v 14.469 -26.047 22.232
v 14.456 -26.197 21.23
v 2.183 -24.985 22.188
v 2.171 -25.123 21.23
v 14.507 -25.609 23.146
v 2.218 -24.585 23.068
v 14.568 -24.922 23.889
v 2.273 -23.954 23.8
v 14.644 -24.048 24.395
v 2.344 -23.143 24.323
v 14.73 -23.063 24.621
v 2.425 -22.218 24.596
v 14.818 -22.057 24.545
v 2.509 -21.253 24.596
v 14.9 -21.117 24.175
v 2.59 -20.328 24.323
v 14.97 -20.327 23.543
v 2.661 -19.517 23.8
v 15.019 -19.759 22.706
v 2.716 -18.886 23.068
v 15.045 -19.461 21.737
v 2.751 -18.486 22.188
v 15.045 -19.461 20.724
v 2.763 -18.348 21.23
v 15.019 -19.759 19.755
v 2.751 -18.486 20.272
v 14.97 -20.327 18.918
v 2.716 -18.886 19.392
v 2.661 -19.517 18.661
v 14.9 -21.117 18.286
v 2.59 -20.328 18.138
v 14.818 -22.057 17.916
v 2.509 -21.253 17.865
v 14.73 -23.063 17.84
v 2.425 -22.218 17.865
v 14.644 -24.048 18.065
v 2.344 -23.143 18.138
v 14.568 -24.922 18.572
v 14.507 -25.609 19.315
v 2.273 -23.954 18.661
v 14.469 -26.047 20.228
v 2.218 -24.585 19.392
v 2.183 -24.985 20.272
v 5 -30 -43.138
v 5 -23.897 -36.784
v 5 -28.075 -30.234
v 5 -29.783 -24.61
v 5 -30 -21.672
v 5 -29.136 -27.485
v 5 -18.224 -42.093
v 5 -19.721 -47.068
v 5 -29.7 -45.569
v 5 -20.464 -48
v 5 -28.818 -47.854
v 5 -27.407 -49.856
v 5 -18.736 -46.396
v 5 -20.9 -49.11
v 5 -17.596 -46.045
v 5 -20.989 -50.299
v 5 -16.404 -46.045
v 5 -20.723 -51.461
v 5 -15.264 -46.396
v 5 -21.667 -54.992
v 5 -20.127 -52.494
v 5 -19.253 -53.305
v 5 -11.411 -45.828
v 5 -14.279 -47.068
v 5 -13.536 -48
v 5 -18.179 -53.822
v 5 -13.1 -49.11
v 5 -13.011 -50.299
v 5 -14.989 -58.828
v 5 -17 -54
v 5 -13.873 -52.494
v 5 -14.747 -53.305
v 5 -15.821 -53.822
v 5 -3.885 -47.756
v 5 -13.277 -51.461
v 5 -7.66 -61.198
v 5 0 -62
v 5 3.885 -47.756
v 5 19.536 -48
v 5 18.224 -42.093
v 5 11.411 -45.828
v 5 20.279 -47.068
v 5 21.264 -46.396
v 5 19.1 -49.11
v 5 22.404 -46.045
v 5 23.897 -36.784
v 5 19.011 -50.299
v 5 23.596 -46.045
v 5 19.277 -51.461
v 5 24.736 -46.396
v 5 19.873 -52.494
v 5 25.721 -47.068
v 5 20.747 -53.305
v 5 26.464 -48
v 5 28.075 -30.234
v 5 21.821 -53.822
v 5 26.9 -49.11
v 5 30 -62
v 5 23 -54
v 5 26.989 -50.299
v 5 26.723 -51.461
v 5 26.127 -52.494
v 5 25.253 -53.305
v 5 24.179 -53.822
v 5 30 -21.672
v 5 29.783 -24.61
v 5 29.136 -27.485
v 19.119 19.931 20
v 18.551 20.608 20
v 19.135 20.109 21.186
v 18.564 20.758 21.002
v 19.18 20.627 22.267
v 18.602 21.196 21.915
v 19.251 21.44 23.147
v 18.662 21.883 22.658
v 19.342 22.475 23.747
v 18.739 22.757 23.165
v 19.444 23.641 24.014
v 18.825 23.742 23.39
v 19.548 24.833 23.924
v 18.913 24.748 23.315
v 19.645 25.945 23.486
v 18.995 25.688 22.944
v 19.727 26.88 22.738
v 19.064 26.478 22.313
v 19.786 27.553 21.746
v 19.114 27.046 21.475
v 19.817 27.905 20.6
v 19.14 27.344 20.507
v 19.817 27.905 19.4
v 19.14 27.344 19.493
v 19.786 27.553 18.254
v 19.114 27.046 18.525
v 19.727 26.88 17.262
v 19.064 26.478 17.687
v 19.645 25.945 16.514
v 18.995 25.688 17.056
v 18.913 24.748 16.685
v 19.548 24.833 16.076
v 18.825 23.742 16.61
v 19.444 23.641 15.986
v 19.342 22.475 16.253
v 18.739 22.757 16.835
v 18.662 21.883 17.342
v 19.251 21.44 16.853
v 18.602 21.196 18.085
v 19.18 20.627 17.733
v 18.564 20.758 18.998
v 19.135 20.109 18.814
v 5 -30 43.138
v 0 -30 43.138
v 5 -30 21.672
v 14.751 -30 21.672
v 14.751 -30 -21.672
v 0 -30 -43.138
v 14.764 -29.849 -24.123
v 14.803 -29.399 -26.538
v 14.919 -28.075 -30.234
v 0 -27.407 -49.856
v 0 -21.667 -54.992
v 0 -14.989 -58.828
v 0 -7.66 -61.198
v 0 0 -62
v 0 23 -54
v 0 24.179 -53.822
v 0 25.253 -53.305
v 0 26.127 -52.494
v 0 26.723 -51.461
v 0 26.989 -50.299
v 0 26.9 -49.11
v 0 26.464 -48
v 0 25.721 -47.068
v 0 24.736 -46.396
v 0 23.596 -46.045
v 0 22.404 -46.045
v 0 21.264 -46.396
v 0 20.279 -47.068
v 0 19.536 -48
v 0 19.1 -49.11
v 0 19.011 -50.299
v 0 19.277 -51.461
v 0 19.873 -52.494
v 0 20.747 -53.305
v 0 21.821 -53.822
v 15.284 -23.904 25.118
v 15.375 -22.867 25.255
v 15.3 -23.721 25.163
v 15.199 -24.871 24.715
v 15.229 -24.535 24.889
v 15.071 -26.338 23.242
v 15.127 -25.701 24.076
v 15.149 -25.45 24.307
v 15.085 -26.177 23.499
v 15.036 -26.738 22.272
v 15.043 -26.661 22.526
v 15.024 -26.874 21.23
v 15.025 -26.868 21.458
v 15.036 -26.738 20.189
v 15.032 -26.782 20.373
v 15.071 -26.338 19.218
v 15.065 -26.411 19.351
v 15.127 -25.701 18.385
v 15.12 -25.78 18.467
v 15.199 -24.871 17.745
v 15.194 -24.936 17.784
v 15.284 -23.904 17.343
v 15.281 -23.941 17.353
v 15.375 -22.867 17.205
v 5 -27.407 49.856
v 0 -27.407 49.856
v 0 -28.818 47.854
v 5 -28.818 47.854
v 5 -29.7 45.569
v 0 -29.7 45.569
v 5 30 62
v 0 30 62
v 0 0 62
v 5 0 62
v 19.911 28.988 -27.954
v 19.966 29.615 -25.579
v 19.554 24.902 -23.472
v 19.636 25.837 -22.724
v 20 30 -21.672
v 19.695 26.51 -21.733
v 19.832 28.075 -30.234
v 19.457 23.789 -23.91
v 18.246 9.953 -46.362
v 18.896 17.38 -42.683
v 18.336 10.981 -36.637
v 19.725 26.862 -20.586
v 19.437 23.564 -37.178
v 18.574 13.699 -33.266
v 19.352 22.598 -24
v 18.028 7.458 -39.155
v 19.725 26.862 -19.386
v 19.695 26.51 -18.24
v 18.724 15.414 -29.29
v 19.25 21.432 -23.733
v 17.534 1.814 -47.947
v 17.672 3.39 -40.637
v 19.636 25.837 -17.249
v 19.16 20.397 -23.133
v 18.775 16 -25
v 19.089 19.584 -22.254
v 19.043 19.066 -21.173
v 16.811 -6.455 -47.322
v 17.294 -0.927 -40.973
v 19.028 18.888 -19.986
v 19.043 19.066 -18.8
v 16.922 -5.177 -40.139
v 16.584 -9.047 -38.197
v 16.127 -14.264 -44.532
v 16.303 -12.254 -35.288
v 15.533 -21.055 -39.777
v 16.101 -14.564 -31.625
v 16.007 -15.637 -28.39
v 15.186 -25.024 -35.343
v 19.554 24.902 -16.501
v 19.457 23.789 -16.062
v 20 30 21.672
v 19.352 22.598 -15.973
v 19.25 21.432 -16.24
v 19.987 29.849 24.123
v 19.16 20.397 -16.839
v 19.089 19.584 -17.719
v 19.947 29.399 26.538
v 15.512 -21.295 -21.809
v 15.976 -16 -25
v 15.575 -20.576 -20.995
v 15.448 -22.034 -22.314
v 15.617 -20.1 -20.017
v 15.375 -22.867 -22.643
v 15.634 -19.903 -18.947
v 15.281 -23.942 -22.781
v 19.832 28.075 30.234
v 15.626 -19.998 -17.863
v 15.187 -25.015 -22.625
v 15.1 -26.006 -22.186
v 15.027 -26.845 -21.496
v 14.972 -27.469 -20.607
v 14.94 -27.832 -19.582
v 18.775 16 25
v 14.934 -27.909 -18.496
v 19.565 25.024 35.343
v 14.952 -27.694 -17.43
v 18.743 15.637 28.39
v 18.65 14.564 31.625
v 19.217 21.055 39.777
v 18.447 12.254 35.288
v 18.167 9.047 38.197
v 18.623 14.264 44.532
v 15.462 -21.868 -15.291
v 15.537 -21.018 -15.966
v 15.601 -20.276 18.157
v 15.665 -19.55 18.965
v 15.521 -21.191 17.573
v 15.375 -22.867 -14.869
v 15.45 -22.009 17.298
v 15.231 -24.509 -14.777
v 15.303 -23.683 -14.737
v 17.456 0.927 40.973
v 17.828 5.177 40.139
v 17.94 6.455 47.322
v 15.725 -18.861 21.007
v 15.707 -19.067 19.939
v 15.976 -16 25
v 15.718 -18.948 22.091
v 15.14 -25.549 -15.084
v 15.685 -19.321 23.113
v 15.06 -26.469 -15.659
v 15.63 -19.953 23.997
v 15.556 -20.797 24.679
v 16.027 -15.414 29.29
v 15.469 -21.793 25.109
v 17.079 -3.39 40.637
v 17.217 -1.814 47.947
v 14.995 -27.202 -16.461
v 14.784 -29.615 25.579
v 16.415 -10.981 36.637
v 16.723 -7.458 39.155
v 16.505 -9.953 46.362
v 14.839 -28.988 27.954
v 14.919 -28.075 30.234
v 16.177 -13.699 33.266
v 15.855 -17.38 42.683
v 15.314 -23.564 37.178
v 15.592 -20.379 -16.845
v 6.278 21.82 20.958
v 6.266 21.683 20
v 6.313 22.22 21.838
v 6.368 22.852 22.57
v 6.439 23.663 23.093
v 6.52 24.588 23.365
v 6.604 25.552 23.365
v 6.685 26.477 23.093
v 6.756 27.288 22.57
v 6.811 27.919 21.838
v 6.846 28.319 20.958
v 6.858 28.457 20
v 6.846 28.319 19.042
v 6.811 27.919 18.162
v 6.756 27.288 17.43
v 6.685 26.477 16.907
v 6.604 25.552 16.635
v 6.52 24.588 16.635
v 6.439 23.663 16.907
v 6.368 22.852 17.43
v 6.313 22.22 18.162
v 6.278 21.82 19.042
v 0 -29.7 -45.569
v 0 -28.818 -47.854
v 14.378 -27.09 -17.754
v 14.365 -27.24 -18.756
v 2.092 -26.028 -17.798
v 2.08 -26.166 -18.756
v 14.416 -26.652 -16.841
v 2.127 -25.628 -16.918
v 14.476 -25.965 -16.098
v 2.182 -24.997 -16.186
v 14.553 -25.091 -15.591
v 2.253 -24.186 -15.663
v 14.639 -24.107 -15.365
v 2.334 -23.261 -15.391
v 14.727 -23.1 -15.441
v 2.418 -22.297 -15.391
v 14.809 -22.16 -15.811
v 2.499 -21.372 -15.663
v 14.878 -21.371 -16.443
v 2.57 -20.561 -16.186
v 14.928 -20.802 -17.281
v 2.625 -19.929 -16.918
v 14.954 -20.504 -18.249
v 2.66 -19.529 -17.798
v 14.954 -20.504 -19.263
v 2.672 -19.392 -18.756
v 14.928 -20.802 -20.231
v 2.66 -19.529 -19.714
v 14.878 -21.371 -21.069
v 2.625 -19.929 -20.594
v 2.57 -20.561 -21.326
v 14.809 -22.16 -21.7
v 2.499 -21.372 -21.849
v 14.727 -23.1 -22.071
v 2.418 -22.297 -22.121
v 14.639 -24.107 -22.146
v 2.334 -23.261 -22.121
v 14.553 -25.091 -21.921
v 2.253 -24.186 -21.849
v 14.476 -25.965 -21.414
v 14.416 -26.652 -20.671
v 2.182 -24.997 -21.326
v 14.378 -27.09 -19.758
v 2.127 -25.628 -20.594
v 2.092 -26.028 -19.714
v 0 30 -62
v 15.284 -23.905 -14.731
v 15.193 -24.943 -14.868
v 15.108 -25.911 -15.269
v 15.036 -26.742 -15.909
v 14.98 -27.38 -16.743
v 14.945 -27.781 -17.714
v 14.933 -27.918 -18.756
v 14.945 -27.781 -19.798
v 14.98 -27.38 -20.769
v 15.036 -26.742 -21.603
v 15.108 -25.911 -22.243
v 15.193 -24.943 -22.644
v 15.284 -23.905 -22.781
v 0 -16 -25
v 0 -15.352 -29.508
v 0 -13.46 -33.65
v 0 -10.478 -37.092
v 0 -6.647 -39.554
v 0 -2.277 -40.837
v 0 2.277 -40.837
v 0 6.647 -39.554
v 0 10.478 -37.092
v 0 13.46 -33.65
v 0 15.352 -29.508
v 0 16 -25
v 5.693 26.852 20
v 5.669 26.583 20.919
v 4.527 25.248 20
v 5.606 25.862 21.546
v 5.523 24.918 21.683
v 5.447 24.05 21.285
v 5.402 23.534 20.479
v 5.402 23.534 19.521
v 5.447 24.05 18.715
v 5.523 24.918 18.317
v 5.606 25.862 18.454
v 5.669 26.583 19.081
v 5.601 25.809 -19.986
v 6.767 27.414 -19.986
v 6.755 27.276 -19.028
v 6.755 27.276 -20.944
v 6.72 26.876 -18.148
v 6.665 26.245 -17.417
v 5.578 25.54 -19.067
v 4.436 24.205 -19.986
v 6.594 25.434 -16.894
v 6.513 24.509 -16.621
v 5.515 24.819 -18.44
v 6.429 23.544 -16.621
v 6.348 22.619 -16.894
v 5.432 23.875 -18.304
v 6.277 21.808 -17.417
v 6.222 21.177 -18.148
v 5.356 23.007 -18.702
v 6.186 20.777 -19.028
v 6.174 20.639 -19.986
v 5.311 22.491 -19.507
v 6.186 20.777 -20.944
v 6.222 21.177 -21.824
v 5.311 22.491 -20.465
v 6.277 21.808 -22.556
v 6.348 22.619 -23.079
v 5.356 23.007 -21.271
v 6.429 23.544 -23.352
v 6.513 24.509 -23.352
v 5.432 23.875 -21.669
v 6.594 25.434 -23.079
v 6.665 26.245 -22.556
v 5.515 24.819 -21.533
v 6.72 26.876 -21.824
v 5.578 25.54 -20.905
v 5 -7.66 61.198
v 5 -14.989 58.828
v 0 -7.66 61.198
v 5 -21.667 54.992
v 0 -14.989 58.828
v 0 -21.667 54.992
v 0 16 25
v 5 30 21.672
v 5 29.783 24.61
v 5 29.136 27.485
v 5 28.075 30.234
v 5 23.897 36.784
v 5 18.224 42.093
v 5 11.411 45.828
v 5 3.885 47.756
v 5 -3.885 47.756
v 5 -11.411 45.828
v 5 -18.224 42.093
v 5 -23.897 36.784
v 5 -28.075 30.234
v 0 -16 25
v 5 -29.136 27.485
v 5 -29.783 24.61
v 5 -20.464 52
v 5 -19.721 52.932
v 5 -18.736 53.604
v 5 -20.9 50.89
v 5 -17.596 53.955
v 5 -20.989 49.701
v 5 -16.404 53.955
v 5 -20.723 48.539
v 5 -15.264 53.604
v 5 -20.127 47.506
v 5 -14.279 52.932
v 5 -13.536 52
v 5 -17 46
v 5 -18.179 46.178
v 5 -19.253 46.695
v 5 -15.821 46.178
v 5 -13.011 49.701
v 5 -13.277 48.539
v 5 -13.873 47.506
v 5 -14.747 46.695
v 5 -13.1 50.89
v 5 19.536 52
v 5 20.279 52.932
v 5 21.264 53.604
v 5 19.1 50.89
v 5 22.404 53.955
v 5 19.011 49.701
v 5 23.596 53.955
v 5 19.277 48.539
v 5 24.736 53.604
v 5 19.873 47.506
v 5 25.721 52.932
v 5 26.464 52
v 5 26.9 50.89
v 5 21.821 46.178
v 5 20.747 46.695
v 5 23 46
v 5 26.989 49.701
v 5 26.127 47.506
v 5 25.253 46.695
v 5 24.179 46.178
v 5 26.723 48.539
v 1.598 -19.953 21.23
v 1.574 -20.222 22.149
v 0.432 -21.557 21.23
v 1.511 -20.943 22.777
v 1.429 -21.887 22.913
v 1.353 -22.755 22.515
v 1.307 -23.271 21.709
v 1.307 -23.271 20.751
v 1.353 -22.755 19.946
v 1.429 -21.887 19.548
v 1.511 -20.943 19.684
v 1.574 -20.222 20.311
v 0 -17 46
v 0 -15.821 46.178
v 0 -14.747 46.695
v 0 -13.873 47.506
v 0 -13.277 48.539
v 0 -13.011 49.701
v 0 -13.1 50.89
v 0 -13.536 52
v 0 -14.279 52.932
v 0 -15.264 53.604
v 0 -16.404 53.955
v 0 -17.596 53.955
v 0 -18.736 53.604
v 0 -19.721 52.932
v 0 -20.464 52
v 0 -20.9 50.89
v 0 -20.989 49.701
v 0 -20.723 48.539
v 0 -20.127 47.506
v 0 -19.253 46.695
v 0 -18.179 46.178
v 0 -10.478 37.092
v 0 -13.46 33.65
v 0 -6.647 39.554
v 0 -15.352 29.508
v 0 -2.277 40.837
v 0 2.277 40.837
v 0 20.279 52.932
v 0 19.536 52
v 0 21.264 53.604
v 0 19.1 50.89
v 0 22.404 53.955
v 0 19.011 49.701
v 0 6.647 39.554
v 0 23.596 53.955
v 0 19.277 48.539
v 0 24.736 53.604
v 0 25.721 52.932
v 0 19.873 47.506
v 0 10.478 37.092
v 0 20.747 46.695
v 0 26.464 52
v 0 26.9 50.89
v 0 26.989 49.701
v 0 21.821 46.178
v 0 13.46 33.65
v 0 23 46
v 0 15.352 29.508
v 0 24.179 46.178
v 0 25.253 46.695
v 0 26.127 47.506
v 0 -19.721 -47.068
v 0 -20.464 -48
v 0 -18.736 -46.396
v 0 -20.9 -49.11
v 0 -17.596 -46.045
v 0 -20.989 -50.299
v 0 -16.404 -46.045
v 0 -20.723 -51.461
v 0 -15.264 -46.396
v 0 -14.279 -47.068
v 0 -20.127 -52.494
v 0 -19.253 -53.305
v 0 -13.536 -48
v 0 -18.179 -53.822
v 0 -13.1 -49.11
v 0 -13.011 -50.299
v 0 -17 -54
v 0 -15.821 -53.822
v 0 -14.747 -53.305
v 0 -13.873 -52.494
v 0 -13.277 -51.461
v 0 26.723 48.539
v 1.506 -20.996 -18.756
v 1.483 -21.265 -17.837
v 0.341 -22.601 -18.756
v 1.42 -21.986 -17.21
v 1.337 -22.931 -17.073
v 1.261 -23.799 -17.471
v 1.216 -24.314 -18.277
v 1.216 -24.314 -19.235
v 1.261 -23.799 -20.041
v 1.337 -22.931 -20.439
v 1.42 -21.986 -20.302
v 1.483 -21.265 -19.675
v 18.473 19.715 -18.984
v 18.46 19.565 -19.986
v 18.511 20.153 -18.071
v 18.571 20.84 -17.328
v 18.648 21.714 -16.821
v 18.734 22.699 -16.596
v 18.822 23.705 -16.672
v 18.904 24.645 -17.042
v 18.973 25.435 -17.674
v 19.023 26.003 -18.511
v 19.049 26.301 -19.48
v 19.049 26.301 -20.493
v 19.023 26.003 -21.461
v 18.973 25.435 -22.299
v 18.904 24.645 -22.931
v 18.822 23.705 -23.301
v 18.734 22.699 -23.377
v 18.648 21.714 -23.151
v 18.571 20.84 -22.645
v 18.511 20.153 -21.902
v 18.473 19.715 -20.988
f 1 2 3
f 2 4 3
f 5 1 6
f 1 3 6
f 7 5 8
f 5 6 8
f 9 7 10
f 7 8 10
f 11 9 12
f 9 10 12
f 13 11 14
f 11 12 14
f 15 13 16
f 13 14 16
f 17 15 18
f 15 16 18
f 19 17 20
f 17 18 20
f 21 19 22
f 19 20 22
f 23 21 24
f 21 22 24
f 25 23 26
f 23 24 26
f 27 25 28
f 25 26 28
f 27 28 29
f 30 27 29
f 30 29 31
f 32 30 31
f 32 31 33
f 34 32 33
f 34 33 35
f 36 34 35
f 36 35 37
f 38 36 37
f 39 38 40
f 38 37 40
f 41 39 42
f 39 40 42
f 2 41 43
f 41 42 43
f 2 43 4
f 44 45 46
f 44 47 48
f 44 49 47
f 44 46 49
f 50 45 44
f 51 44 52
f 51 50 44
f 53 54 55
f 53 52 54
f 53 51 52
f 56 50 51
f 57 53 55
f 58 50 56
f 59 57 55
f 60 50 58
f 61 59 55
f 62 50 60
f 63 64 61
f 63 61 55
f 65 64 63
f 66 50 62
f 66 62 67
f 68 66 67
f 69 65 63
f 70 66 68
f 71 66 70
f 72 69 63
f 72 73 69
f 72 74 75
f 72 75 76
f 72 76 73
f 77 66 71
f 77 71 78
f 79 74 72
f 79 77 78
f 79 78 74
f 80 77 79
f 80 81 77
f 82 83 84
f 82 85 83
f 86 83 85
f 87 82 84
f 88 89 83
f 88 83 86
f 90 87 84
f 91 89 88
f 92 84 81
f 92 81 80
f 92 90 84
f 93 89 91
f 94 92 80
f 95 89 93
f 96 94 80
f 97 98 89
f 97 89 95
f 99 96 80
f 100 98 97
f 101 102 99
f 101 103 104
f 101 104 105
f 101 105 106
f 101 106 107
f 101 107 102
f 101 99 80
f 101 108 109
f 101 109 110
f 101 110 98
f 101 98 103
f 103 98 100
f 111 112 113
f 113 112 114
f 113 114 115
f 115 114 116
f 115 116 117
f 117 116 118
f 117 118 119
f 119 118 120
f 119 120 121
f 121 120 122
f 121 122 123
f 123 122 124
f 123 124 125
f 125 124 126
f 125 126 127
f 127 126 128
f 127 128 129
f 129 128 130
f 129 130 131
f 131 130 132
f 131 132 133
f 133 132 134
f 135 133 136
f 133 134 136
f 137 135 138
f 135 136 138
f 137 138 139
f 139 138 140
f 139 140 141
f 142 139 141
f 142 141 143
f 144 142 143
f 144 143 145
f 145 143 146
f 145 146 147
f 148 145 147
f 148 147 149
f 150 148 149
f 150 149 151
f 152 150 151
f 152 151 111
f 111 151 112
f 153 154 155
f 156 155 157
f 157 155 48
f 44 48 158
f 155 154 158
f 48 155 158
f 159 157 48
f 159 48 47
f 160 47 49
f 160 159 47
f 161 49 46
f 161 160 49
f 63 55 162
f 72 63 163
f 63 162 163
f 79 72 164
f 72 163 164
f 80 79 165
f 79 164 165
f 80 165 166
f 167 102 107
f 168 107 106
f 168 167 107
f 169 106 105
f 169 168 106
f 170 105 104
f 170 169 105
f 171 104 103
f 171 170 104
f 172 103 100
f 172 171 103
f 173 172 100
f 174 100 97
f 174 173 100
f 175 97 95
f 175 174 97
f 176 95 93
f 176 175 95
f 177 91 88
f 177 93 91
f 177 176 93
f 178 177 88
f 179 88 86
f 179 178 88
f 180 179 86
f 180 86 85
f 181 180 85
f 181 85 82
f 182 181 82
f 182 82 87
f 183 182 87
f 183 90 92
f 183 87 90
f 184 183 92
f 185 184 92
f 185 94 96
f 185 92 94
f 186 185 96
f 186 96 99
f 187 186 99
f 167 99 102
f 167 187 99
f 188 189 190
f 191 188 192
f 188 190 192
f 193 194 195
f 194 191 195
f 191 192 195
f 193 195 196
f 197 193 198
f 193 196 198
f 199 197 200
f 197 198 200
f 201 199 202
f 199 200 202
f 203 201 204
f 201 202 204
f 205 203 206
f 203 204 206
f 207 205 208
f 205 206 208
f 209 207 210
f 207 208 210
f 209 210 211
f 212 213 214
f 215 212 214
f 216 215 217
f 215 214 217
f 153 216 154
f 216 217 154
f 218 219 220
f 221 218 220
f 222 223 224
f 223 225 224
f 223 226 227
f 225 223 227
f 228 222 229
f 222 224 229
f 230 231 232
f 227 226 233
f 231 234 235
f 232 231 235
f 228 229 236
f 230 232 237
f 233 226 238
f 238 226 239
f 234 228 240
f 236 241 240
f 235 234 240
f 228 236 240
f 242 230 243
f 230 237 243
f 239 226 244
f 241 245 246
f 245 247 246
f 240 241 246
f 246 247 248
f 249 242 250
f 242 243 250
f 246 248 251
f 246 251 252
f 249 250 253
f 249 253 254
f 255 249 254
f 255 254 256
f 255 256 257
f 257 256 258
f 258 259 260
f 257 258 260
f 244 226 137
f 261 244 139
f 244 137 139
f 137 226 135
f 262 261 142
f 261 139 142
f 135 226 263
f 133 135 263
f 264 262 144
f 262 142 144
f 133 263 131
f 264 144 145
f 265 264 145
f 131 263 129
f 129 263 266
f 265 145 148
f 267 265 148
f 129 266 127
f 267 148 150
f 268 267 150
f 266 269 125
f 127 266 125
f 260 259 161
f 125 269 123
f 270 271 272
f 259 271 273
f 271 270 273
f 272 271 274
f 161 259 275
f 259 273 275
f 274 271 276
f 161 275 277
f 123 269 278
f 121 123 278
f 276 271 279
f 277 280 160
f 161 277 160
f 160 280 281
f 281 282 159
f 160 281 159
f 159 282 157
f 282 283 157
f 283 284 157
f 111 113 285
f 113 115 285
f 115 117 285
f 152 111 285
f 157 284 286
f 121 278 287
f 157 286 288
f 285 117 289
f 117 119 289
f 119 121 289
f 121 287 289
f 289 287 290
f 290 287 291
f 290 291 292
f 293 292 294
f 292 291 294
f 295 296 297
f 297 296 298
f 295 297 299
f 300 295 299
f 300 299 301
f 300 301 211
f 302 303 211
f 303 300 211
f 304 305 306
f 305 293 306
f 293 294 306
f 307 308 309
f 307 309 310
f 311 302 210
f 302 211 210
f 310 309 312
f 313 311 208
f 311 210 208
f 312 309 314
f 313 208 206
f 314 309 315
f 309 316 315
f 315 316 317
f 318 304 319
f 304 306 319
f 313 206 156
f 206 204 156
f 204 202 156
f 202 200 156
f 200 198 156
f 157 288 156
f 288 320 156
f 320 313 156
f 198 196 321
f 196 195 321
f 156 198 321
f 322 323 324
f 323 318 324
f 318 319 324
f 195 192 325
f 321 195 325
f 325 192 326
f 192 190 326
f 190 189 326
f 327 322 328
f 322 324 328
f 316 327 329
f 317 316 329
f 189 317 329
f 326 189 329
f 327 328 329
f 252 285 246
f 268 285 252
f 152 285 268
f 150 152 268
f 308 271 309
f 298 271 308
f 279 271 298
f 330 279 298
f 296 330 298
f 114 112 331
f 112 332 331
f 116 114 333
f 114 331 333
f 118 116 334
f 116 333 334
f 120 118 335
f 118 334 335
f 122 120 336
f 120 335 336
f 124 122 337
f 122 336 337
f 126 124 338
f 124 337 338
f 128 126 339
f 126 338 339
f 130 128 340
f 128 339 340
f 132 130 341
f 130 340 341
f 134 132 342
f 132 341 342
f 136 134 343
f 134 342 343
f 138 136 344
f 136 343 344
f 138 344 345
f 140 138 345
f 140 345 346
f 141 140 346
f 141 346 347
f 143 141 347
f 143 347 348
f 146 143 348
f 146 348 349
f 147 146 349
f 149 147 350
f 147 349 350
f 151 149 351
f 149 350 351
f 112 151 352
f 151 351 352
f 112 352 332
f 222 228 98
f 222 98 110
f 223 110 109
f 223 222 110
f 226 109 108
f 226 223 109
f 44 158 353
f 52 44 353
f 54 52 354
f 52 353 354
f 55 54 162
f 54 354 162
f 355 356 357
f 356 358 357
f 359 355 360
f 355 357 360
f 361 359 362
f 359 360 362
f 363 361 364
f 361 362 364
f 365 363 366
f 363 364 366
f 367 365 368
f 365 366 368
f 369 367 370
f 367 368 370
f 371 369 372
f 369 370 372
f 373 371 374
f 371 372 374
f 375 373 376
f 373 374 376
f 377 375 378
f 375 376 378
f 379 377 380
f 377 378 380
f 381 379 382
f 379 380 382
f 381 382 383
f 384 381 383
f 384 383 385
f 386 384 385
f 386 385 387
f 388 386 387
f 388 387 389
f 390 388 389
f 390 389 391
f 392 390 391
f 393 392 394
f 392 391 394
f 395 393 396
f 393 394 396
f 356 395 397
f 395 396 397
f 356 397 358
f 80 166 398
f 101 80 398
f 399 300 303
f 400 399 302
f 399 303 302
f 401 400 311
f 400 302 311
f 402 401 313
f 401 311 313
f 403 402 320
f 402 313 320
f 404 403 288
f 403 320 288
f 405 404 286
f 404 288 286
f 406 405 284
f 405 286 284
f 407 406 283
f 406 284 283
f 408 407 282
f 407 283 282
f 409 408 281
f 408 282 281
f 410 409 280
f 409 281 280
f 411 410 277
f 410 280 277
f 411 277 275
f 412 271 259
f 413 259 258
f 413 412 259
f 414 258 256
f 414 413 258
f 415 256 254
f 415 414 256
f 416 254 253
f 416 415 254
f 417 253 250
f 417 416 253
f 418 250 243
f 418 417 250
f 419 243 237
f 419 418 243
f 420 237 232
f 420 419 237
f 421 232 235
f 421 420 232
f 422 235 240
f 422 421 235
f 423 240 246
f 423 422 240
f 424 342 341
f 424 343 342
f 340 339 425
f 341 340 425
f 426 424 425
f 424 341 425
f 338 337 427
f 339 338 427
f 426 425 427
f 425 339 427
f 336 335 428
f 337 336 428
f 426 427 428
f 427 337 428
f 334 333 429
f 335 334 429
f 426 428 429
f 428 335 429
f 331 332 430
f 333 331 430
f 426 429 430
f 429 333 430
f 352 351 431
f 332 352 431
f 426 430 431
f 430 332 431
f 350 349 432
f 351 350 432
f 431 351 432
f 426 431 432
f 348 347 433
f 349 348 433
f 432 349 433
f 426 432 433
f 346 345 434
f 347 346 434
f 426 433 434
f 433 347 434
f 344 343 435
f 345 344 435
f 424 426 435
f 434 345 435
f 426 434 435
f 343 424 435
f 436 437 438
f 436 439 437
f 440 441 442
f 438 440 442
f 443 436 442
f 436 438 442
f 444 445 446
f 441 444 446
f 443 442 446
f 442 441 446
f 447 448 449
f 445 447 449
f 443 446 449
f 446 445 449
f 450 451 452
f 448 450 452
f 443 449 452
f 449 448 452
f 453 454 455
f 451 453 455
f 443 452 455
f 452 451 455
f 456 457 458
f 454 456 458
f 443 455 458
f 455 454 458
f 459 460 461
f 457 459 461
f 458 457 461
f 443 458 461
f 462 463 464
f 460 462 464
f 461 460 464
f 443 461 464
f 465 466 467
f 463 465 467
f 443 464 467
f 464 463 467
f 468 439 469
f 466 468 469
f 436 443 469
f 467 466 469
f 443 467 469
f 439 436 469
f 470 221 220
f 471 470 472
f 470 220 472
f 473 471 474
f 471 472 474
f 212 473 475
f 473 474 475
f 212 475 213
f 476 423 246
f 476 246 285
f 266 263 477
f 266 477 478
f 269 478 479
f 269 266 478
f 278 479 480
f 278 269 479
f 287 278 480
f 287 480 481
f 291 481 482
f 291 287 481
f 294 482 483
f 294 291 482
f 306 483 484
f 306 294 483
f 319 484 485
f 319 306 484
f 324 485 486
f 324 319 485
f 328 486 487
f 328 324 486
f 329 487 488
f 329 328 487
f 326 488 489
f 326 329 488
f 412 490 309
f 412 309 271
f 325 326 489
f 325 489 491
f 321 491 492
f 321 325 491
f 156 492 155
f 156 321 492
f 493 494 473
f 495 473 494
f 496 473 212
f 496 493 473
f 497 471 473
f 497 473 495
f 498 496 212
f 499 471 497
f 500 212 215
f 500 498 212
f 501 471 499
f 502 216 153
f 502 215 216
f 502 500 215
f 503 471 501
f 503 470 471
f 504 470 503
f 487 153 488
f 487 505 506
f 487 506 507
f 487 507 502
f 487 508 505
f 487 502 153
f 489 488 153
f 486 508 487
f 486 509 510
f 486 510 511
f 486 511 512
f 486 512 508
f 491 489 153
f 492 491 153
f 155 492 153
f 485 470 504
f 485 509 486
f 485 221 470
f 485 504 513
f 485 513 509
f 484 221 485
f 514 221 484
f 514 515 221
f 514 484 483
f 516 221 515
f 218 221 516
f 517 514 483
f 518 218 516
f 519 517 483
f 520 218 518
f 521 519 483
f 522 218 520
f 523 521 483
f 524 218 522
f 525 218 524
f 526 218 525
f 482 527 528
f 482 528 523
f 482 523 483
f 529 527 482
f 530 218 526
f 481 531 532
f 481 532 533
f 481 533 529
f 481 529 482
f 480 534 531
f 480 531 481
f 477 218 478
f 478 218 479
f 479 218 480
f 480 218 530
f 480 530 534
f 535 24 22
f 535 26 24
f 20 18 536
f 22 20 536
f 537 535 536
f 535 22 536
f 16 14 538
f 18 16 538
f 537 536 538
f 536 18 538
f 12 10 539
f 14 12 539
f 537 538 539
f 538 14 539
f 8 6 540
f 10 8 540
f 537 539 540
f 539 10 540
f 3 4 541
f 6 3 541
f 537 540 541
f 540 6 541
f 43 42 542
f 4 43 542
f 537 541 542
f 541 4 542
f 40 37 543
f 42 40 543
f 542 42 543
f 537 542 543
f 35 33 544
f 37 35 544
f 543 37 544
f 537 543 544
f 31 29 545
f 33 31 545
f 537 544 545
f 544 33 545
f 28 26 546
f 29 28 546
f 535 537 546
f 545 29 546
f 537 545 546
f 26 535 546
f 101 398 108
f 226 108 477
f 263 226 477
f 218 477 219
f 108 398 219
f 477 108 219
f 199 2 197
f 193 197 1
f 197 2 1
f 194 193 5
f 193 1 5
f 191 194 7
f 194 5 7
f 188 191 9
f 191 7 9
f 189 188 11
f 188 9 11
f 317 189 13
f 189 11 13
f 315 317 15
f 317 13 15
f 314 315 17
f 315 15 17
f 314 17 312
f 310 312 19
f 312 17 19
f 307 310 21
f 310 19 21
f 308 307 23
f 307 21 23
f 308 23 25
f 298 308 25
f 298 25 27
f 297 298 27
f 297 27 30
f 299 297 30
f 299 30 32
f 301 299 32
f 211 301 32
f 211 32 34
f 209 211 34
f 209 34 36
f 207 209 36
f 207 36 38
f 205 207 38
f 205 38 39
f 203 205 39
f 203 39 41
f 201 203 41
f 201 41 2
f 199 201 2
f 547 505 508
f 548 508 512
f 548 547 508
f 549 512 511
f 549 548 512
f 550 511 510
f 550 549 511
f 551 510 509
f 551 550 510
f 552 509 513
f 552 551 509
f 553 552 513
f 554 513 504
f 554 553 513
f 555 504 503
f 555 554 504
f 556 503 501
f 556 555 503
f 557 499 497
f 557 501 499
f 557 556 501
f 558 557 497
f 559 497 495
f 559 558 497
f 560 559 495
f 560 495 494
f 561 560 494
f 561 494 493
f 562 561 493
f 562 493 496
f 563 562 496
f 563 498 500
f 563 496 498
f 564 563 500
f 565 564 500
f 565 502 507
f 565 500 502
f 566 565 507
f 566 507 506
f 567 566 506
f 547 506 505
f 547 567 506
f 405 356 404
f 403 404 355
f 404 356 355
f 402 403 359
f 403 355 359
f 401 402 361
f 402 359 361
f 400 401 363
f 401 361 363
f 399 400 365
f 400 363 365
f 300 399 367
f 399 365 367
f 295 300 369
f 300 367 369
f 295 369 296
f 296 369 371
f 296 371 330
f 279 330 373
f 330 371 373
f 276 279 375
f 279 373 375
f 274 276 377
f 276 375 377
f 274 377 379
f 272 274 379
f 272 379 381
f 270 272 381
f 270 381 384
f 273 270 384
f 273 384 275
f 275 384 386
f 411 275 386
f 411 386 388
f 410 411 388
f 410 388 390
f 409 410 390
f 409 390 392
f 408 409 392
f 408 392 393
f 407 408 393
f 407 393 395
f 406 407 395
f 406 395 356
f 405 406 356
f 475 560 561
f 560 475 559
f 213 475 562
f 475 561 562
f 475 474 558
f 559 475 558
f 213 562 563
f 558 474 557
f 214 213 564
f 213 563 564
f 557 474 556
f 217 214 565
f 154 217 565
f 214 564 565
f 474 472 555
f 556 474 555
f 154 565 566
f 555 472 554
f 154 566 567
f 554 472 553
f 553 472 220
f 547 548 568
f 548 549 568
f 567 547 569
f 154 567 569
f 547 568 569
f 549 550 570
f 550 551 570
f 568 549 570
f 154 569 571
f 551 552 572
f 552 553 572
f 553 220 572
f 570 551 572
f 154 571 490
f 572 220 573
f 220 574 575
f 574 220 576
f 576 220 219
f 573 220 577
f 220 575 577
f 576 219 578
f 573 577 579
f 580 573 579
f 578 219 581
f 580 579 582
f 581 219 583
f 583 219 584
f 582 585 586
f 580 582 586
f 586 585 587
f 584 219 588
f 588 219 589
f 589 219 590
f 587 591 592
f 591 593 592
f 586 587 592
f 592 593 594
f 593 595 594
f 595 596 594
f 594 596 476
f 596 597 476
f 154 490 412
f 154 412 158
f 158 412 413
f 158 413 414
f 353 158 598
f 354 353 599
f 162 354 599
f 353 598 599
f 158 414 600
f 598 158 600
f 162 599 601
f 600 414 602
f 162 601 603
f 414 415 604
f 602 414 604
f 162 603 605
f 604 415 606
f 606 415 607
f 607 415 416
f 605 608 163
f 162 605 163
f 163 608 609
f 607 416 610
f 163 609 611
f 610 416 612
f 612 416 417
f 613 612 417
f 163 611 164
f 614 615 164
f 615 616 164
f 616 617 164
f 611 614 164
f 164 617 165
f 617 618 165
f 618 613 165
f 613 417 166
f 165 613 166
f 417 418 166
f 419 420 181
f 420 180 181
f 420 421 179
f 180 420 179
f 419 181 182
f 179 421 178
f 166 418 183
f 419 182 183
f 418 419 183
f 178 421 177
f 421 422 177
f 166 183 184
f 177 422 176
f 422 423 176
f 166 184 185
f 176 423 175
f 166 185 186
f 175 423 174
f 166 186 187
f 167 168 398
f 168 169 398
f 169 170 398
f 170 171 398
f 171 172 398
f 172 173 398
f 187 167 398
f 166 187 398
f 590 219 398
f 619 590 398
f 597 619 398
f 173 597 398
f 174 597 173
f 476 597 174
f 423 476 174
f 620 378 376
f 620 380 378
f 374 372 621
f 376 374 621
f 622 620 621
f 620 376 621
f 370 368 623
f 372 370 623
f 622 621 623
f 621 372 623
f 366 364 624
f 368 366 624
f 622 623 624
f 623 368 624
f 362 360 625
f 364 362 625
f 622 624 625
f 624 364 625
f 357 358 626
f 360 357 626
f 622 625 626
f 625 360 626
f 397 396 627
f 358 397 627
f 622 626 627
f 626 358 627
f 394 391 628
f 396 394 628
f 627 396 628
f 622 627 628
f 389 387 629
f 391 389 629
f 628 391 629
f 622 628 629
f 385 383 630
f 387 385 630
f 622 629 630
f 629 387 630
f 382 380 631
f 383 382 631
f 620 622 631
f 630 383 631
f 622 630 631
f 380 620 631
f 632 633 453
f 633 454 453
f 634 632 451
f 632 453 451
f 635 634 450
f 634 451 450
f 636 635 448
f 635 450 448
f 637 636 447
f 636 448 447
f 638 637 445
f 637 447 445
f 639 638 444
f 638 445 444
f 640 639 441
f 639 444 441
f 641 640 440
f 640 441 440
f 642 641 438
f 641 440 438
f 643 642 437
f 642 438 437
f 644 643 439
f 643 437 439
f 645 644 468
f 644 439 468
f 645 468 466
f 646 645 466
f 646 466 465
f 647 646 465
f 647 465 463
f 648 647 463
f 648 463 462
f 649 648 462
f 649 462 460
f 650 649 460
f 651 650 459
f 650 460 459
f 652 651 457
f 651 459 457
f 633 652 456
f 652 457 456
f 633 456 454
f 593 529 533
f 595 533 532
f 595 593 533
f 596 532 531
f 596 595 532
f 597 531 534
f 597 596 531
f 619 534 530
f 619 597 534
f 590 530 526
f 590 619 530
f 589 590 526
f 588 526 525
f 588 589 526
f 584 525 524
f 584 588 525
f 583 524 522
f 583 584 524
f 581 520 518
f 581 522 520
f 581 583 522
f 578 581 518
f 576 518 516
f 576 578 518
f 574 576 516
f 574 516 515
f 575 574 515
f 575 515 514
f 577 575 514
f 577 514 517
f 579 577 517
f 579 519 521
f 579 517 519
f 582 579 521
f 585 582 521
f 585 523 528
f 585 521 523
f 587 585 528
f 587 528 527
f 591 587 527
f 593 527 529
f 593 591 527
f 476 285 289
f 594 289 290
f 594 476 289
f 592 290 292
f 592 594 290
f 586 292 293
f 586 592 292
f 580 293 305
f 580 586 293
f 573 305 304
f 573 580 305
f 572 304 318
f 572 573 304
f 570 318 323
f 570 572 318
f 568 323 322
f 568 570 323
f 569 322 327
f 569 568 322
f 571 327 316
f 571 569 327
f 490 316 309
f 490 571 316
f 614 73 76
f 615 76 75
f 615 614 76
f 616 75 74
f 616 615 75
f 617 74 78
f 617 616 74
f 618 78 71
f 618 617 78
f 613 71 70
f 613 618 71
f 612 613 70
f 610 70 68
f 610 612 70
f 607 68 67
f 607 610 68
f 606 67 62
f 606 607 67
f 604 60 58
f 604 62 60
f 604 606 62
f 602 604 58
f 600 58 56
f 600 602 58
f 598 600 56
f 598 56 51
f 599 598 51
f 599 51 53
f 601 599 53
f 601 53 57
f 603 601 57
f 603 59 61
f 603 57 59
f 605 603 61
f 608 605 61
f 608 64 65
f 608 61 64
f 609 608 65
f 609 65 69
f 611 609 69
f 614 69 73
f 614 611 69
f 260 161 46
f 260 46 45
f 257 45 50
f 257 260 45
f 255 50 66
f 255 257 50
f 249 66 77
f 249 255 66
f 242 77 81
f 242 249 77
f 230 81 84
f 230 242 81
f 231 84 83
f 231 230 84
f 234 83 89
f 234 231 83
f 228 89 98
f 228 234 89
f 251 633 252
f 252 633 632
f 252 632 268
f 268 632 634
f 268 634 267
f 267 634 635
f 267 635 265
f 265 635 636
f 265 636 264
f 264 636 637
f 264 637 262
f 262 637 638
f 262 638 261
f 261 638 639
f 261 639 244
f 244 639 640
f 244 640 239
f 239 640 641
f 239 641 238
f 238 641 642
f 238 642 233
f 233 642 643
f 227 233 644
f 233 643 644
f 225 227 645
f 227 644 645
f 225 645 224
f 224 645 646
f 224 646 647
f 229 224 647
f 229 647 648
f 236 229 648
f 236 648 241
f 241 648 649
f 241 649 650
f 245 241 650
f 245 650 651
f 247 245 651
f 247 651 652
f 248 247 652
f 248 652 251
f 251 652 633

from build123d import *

# Parameters (mm, degrees)
SZKIC1_R                                   = 4
DODANIE_WYCI_GNI_CIE1_DEPTH                = 20
SZKIC2_OUTSIDE_W                           = 153.84
SZKIC2_OUTSIDE_H                           = 89.84
WYTNIJ_WYCI_GNI_CIE1_DEPTH                 = 15
WYTNIJ_WYCI_GNI_CIE2_DEPTH                 = 130.135587659
WYTNIJ_WYCI_GNI_CIE2_DEPTH_BACK            = 130.135587659
OTW_R_GWINTOWANY_M81_D                     = 6.8
OTW_R_GWINTOWANY_M81_DEPTH                 = 12.957073895
OTW_R_GWINTOWANY_M81_CSINK_D               = 8.05
OTW_R_GWINTOWANY_M81_CSINK_ANGLE           = 90
OTW_R_GWINTOWANY_M81_TIP                   = 2.042926105
OTW_R_GWINTOWANY_M81_ON_FACE_2_D           = 6.8
OTW_R_GWINTOWANY_M81_ON_FACE_2_DEPTH       = 12.957073895
OTW_R_GWINTOWANY_M81_ON_FACE_2_CSINK_D     = 8.05
OTW_R_GWINTOWANY_M81_ON_FACE_2_CSINK_ANGLE = 90
OTW_R_GWINTOWANY_M81_ON_FACE_2_TIP         = 2.042926105


with BuildPart() as part:
    # Szkic1 → Dodanie-wyciągnięcie1 (new body)
    with BuildSketch(Plane(origin=(0, 0, 0), x_dir=(0, 0, -1), z_dir=(1, 0, 0))):
        with BuildLine():
            Line((-43.138357147, -30), (43.138357147, -30))
            ThreePointArc((43.138357147, -30), (46.738768646, -29.329364235), (49.856267202, -27.407407407))
            ThreePointArc((49.856267202, -27.407407407), (58.828108774, -14.988630917), (62, 0))
            Line((62, 0), (62, 30))
            Line((62, 30), (-62, 30))
            Line((-62, 30), (-62, 0))
            ThreePointArc((-62, 0), (-58.828108774, -14.988630917), (-49.856267202, -27.407407407))
            ThreePointArc((-49.856267202, -27.407407407), (-46.738768646, -29.329364235), (-43.138357147, -30))
        make_face()
        with Locations((-50, 23)):
            Circle(SZKIC1_R, mode=Mode.SUBTRACT)
        with Locations((50, 23)):
            Circle(SZKIC1_R, mode=Mode.SUBTRACT)
        with Locations((50, -17)):
            Circle(SZKIC1_R, mode=Mode.SUBTRACT)
        with Locations((-50, -17)):
            Circle(SZKIC1_R, mode=Mode.SUBTRACT)
        with BuildLine():
            Line((-25, -16), (25, -16))
            ThreePointArc((25, -16), (41, 0), (25, 16))
            Line((25, 16), (-25, 16))
            ThreePointArc((-25, 16), (-41, 0), (-25, -16))
        make_face(mode=Mode.SUBTRACT)
    extrude(amount=DODANIE_WYCI_GNI_CIE1_DEPTH)

    # Szkic2 outside → Wytnij-wyciągnięcie1 (cut)
    # profile 1 of 2: a face of its own
    with BuildSketch(Plane(origin=(20, 0, 0), x_dir=(0, 0, -1), z_dir=(1, 0, 0))):
        Rectangle(SZKIC2_OUTSIDE_W, SZKIC2_OUTSIDE_H)
        with BuildLine():
            Line((21.671768561, 30), (-21.671768561, 30))
            ThreePointArc((-21.671768561, 30), (-26.059642547, 29.512728202), (-30.233707808, 28.074656189))
            ThreePointArc((-30.233707808, 28.074656189), (-48, 0), (-30.233707808, -28.074656189))
            ThreePointArc((-30.233707808, -28.074656189), (-26.059642547, -29.512728202), (-21.671768561, -30))
            Line((-21.671768561, -30), (21.671768561, -30))
            ThreePointArc((21.671768561, -30), (26.059642547, -29.512728202), (30.233707808, -28.074656189))
            ThreePointArc((30.233707808, -28.074656189), (48, 0), (30.233707808, 28.074656189))
            ThreePointArc((30.233707808, 28.074656189), (26.059642547, 29.512728202), (21.671768561, 30))
        make_face(mode=Mode.SUBTRACT)
    # profile 2 of 2: a face of its own
    with BuildSketch(Plane(origin=(20, 0, 0), x_dir=(0, 0, -1), z_dir=(1, 0, 0))):
        with BuildLine():
            Line((-25, -16), (25, -16))
            ThreePointArc((25, -16), (41, 0), (25, 16))
            Line((25, 16), (-25, 16))
            ThreePointArc((-25, 16), (-41, 0), (-25, -16))
        make_face()
    extrude(amount=-WYTNIJ_WYCI_GNI_CIE1_DEPTH, mode=Mode.SUBTRACT)

    # Szkic3 → Wytnij-wyciągnięcie2 (cut, two sides: drawn at the far end of the back side and taken through both)
    with BuildSketch(Plane(origin=(0, 0, -62), x_dir=(-1, 0, 0), z_dir=(0, 0, -1)).offset(-WYTNIJ_WYCI_GNI_CIE2_DEPTH_BACK)):
        Polygon((-20, 30), (-14.750680188, -30), (-20, -30), align=None)
    extrude(amount=WYTNIJ_WYCI_GNI_CIE2_DEPTH + WYTNIJ_WYCI_GNI_CIE2_DEPTH_BACK, mode=Mode.SUBTRACT)

    # Otwór gwintowany M81
    with Locations(Plane(origin=(19.469847212, 23.940325899, 20), x_dir=(0.087155742748, 0.996194698092, 0), z_dir=(0.996194698092, -0.087155742748, 0))):
        with Locations((0, 0), (-1.047077932, -39.986292999)):
            CounterSinkHole(OTW_R_GWINTOWANY_M81_D / 2, OTW_R_GWINTOWANY_M81_CSINK_D / 2, depth=OTW_R_GWINTOWANY_M81_DEPTH, counter_sink_angle=OTW_R_GWINTOWANY_M81_CSINK_ANGLE)
            with Locations((0, 0, -(OTW_R_GWINTOWANY_M81_DEPTH + OTW_R_GWINTOWANY_M81_TIP / 2))):  # 118° drill point
                Cone(0, OTW_R_GWINTOWANY_M81_D / 2, OTW_R_GWINTOWANY_M81_TIP, mode=Mode.SUBTRACT)

    # Otwór gwintowany M81 on face 2
    with Locations(Plane(origin=(15.374931009, -22.864780472, 21.23031657), x_dir=(0.087155971833, 0.996194678049, 0), z_dir=(0.996194678049, -0.087155971833, 0))):
        with Locations((0, 0), (-1.047077932, -39.986292999)):
            CounterSinkHole(OTW_R_GWINTOWANY_M81_ON_FACE_2_D / 2, OTW_R_GWINTOWANY_M81_ON_FACE_2_CSINK_D / 2, depth=OTW_R_GWINTOWANY_M81_ON_FACE_2_DEPTH, counter_sink_angle=OTW_R_GWINTOWANY_M81_ON_FACE_2_CSINK_ANGLE)
            with Locations((0, 0, -(OTW_R_GWINTOWANY_M81_ON_FACE_2_DEPTH + OTW_R_GWINTOWANY_M81_ON_FACE_2_TIP / 2))):  # 118° drill point
                Cone(0, OTW_R_GWINTOWANY_M81_ON_FACE_2_D / 2, OTW_R_GWINTOWANY_M81_ON_FACE_2_TIP, mode=Mode.SUBTRACT)


solid = part.part
